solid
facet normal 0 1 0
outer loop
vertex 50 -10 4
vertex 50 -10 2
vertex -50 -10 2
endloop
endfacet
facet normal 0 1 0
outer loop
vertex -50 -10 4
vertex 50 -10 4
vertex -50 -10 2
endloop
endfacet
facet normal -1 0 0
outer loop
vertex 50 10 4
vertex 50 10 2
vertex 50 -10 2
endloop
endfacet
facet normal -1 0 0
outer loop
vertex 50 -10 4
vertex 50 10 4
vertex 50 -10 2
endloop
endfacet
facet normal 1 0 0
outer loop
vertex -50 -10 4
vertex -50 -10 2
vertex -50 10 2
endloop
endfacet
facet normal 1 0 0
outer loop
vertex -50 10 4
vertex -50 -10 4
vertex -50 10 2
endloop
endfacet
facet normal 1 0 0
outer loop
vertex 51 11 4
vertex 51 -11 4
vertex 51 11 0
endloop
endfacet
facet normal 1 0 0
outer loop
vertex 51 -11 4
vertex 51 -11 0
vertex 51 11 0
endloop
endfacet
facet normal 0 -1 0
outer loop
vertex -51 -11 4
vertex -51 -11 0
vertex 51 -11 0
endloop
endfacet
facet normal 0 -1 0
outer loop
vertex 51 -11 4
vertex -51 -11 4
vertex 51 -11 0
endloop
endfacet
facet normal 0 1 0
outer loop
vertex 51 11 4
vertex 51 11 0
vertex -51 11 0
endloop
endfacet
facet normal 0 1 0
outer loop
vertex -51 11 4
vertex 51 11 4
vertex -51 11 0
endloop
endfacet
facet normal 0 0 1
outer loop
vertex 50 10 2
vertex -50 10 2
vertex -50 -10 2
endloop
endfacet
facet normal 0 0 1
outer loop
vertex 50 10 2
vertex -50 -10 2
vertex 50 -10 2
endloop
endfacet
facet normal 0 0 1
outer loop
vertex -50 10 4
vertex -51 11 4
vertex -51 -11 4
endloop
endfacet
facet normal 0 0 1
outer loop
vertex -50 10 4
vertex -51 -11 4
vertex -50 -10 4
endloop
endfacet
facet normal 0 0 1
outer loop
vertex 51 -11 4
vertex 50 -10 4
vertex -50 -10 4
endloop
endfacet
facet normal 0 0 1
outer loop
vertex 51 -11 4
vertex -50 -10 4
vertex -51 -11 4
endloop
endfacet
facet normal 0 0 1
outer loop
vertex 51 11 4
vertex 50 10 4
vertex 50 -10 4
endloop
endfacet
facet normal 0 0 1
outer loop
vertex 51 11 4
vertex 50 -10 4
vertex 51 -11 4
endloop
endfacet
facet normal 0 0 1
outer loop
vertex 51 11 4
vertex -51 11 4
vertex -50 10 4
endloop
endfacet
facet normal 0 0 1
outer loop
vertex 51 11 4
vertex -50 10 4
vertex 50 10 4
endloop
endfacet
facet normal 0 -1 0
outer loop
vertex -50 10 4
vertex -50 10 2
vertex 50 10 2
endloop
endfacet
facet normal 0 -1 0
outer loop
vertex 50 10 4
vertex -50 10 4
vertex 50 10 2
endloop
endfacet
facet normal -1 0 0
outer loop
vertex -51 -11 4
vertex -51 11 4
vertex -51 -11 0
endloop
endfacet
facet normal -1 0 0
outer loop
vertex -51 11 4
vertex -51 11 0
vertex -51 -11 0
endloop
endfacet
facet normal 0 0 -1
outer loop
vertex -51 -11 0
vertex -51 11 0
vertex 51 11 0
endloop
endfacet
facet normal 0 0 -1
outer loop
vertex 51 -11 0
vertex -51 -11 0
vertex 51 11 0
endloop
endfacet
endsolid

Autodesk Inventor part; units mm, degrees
ref_plane "YZ Plane" through (0, 0, 0) normal (1, 0, 0) x (0, 1, 0)
ref_plane "XZ Plane" through (0, 0, 0) normal (0, 1, 0) x (-1, 0, 0)
ref_plane "XY Plane" through (0, 0, 0) normal (0, 0, 1) x (1, 0, 0)
sketch "Sketch1" plane through (0, 0, 0) normal (0, 0, 1) x (1, 0, 0)
  line L0 (-50, 10) -> (50, 10)
  line L1 (50, 10) -> (50, -10)
  line L2 (50, -10) -> (-50, -10)
  line L3 (-50, -10) -> (-50, 10)
  line L4 (-50, 10) -> (50, -10) construction
  line L5 (50, 10) -> (-50, -10) construction
  line L6 (51, 11) -> (-51, 11)
  line L7 (-51, 11) -> (-51, -11)
  line L8 (-51, -11) -> (51, -11)
  line L9 (51, -11) -> (51, 11)
  point P0 (0, 0)
  dimension "d0" = 100
  dimension "d1" = 20
  dimension "d2" = 1
extrude "Extrusion1" add sketch "Sketch1" along normal blind 2 contours L0 L1 L2 L3
extrude "Extrusion2" add sketch "Sketch1" along normal blind 4
properties part number "eit_chamber_solid_base"
